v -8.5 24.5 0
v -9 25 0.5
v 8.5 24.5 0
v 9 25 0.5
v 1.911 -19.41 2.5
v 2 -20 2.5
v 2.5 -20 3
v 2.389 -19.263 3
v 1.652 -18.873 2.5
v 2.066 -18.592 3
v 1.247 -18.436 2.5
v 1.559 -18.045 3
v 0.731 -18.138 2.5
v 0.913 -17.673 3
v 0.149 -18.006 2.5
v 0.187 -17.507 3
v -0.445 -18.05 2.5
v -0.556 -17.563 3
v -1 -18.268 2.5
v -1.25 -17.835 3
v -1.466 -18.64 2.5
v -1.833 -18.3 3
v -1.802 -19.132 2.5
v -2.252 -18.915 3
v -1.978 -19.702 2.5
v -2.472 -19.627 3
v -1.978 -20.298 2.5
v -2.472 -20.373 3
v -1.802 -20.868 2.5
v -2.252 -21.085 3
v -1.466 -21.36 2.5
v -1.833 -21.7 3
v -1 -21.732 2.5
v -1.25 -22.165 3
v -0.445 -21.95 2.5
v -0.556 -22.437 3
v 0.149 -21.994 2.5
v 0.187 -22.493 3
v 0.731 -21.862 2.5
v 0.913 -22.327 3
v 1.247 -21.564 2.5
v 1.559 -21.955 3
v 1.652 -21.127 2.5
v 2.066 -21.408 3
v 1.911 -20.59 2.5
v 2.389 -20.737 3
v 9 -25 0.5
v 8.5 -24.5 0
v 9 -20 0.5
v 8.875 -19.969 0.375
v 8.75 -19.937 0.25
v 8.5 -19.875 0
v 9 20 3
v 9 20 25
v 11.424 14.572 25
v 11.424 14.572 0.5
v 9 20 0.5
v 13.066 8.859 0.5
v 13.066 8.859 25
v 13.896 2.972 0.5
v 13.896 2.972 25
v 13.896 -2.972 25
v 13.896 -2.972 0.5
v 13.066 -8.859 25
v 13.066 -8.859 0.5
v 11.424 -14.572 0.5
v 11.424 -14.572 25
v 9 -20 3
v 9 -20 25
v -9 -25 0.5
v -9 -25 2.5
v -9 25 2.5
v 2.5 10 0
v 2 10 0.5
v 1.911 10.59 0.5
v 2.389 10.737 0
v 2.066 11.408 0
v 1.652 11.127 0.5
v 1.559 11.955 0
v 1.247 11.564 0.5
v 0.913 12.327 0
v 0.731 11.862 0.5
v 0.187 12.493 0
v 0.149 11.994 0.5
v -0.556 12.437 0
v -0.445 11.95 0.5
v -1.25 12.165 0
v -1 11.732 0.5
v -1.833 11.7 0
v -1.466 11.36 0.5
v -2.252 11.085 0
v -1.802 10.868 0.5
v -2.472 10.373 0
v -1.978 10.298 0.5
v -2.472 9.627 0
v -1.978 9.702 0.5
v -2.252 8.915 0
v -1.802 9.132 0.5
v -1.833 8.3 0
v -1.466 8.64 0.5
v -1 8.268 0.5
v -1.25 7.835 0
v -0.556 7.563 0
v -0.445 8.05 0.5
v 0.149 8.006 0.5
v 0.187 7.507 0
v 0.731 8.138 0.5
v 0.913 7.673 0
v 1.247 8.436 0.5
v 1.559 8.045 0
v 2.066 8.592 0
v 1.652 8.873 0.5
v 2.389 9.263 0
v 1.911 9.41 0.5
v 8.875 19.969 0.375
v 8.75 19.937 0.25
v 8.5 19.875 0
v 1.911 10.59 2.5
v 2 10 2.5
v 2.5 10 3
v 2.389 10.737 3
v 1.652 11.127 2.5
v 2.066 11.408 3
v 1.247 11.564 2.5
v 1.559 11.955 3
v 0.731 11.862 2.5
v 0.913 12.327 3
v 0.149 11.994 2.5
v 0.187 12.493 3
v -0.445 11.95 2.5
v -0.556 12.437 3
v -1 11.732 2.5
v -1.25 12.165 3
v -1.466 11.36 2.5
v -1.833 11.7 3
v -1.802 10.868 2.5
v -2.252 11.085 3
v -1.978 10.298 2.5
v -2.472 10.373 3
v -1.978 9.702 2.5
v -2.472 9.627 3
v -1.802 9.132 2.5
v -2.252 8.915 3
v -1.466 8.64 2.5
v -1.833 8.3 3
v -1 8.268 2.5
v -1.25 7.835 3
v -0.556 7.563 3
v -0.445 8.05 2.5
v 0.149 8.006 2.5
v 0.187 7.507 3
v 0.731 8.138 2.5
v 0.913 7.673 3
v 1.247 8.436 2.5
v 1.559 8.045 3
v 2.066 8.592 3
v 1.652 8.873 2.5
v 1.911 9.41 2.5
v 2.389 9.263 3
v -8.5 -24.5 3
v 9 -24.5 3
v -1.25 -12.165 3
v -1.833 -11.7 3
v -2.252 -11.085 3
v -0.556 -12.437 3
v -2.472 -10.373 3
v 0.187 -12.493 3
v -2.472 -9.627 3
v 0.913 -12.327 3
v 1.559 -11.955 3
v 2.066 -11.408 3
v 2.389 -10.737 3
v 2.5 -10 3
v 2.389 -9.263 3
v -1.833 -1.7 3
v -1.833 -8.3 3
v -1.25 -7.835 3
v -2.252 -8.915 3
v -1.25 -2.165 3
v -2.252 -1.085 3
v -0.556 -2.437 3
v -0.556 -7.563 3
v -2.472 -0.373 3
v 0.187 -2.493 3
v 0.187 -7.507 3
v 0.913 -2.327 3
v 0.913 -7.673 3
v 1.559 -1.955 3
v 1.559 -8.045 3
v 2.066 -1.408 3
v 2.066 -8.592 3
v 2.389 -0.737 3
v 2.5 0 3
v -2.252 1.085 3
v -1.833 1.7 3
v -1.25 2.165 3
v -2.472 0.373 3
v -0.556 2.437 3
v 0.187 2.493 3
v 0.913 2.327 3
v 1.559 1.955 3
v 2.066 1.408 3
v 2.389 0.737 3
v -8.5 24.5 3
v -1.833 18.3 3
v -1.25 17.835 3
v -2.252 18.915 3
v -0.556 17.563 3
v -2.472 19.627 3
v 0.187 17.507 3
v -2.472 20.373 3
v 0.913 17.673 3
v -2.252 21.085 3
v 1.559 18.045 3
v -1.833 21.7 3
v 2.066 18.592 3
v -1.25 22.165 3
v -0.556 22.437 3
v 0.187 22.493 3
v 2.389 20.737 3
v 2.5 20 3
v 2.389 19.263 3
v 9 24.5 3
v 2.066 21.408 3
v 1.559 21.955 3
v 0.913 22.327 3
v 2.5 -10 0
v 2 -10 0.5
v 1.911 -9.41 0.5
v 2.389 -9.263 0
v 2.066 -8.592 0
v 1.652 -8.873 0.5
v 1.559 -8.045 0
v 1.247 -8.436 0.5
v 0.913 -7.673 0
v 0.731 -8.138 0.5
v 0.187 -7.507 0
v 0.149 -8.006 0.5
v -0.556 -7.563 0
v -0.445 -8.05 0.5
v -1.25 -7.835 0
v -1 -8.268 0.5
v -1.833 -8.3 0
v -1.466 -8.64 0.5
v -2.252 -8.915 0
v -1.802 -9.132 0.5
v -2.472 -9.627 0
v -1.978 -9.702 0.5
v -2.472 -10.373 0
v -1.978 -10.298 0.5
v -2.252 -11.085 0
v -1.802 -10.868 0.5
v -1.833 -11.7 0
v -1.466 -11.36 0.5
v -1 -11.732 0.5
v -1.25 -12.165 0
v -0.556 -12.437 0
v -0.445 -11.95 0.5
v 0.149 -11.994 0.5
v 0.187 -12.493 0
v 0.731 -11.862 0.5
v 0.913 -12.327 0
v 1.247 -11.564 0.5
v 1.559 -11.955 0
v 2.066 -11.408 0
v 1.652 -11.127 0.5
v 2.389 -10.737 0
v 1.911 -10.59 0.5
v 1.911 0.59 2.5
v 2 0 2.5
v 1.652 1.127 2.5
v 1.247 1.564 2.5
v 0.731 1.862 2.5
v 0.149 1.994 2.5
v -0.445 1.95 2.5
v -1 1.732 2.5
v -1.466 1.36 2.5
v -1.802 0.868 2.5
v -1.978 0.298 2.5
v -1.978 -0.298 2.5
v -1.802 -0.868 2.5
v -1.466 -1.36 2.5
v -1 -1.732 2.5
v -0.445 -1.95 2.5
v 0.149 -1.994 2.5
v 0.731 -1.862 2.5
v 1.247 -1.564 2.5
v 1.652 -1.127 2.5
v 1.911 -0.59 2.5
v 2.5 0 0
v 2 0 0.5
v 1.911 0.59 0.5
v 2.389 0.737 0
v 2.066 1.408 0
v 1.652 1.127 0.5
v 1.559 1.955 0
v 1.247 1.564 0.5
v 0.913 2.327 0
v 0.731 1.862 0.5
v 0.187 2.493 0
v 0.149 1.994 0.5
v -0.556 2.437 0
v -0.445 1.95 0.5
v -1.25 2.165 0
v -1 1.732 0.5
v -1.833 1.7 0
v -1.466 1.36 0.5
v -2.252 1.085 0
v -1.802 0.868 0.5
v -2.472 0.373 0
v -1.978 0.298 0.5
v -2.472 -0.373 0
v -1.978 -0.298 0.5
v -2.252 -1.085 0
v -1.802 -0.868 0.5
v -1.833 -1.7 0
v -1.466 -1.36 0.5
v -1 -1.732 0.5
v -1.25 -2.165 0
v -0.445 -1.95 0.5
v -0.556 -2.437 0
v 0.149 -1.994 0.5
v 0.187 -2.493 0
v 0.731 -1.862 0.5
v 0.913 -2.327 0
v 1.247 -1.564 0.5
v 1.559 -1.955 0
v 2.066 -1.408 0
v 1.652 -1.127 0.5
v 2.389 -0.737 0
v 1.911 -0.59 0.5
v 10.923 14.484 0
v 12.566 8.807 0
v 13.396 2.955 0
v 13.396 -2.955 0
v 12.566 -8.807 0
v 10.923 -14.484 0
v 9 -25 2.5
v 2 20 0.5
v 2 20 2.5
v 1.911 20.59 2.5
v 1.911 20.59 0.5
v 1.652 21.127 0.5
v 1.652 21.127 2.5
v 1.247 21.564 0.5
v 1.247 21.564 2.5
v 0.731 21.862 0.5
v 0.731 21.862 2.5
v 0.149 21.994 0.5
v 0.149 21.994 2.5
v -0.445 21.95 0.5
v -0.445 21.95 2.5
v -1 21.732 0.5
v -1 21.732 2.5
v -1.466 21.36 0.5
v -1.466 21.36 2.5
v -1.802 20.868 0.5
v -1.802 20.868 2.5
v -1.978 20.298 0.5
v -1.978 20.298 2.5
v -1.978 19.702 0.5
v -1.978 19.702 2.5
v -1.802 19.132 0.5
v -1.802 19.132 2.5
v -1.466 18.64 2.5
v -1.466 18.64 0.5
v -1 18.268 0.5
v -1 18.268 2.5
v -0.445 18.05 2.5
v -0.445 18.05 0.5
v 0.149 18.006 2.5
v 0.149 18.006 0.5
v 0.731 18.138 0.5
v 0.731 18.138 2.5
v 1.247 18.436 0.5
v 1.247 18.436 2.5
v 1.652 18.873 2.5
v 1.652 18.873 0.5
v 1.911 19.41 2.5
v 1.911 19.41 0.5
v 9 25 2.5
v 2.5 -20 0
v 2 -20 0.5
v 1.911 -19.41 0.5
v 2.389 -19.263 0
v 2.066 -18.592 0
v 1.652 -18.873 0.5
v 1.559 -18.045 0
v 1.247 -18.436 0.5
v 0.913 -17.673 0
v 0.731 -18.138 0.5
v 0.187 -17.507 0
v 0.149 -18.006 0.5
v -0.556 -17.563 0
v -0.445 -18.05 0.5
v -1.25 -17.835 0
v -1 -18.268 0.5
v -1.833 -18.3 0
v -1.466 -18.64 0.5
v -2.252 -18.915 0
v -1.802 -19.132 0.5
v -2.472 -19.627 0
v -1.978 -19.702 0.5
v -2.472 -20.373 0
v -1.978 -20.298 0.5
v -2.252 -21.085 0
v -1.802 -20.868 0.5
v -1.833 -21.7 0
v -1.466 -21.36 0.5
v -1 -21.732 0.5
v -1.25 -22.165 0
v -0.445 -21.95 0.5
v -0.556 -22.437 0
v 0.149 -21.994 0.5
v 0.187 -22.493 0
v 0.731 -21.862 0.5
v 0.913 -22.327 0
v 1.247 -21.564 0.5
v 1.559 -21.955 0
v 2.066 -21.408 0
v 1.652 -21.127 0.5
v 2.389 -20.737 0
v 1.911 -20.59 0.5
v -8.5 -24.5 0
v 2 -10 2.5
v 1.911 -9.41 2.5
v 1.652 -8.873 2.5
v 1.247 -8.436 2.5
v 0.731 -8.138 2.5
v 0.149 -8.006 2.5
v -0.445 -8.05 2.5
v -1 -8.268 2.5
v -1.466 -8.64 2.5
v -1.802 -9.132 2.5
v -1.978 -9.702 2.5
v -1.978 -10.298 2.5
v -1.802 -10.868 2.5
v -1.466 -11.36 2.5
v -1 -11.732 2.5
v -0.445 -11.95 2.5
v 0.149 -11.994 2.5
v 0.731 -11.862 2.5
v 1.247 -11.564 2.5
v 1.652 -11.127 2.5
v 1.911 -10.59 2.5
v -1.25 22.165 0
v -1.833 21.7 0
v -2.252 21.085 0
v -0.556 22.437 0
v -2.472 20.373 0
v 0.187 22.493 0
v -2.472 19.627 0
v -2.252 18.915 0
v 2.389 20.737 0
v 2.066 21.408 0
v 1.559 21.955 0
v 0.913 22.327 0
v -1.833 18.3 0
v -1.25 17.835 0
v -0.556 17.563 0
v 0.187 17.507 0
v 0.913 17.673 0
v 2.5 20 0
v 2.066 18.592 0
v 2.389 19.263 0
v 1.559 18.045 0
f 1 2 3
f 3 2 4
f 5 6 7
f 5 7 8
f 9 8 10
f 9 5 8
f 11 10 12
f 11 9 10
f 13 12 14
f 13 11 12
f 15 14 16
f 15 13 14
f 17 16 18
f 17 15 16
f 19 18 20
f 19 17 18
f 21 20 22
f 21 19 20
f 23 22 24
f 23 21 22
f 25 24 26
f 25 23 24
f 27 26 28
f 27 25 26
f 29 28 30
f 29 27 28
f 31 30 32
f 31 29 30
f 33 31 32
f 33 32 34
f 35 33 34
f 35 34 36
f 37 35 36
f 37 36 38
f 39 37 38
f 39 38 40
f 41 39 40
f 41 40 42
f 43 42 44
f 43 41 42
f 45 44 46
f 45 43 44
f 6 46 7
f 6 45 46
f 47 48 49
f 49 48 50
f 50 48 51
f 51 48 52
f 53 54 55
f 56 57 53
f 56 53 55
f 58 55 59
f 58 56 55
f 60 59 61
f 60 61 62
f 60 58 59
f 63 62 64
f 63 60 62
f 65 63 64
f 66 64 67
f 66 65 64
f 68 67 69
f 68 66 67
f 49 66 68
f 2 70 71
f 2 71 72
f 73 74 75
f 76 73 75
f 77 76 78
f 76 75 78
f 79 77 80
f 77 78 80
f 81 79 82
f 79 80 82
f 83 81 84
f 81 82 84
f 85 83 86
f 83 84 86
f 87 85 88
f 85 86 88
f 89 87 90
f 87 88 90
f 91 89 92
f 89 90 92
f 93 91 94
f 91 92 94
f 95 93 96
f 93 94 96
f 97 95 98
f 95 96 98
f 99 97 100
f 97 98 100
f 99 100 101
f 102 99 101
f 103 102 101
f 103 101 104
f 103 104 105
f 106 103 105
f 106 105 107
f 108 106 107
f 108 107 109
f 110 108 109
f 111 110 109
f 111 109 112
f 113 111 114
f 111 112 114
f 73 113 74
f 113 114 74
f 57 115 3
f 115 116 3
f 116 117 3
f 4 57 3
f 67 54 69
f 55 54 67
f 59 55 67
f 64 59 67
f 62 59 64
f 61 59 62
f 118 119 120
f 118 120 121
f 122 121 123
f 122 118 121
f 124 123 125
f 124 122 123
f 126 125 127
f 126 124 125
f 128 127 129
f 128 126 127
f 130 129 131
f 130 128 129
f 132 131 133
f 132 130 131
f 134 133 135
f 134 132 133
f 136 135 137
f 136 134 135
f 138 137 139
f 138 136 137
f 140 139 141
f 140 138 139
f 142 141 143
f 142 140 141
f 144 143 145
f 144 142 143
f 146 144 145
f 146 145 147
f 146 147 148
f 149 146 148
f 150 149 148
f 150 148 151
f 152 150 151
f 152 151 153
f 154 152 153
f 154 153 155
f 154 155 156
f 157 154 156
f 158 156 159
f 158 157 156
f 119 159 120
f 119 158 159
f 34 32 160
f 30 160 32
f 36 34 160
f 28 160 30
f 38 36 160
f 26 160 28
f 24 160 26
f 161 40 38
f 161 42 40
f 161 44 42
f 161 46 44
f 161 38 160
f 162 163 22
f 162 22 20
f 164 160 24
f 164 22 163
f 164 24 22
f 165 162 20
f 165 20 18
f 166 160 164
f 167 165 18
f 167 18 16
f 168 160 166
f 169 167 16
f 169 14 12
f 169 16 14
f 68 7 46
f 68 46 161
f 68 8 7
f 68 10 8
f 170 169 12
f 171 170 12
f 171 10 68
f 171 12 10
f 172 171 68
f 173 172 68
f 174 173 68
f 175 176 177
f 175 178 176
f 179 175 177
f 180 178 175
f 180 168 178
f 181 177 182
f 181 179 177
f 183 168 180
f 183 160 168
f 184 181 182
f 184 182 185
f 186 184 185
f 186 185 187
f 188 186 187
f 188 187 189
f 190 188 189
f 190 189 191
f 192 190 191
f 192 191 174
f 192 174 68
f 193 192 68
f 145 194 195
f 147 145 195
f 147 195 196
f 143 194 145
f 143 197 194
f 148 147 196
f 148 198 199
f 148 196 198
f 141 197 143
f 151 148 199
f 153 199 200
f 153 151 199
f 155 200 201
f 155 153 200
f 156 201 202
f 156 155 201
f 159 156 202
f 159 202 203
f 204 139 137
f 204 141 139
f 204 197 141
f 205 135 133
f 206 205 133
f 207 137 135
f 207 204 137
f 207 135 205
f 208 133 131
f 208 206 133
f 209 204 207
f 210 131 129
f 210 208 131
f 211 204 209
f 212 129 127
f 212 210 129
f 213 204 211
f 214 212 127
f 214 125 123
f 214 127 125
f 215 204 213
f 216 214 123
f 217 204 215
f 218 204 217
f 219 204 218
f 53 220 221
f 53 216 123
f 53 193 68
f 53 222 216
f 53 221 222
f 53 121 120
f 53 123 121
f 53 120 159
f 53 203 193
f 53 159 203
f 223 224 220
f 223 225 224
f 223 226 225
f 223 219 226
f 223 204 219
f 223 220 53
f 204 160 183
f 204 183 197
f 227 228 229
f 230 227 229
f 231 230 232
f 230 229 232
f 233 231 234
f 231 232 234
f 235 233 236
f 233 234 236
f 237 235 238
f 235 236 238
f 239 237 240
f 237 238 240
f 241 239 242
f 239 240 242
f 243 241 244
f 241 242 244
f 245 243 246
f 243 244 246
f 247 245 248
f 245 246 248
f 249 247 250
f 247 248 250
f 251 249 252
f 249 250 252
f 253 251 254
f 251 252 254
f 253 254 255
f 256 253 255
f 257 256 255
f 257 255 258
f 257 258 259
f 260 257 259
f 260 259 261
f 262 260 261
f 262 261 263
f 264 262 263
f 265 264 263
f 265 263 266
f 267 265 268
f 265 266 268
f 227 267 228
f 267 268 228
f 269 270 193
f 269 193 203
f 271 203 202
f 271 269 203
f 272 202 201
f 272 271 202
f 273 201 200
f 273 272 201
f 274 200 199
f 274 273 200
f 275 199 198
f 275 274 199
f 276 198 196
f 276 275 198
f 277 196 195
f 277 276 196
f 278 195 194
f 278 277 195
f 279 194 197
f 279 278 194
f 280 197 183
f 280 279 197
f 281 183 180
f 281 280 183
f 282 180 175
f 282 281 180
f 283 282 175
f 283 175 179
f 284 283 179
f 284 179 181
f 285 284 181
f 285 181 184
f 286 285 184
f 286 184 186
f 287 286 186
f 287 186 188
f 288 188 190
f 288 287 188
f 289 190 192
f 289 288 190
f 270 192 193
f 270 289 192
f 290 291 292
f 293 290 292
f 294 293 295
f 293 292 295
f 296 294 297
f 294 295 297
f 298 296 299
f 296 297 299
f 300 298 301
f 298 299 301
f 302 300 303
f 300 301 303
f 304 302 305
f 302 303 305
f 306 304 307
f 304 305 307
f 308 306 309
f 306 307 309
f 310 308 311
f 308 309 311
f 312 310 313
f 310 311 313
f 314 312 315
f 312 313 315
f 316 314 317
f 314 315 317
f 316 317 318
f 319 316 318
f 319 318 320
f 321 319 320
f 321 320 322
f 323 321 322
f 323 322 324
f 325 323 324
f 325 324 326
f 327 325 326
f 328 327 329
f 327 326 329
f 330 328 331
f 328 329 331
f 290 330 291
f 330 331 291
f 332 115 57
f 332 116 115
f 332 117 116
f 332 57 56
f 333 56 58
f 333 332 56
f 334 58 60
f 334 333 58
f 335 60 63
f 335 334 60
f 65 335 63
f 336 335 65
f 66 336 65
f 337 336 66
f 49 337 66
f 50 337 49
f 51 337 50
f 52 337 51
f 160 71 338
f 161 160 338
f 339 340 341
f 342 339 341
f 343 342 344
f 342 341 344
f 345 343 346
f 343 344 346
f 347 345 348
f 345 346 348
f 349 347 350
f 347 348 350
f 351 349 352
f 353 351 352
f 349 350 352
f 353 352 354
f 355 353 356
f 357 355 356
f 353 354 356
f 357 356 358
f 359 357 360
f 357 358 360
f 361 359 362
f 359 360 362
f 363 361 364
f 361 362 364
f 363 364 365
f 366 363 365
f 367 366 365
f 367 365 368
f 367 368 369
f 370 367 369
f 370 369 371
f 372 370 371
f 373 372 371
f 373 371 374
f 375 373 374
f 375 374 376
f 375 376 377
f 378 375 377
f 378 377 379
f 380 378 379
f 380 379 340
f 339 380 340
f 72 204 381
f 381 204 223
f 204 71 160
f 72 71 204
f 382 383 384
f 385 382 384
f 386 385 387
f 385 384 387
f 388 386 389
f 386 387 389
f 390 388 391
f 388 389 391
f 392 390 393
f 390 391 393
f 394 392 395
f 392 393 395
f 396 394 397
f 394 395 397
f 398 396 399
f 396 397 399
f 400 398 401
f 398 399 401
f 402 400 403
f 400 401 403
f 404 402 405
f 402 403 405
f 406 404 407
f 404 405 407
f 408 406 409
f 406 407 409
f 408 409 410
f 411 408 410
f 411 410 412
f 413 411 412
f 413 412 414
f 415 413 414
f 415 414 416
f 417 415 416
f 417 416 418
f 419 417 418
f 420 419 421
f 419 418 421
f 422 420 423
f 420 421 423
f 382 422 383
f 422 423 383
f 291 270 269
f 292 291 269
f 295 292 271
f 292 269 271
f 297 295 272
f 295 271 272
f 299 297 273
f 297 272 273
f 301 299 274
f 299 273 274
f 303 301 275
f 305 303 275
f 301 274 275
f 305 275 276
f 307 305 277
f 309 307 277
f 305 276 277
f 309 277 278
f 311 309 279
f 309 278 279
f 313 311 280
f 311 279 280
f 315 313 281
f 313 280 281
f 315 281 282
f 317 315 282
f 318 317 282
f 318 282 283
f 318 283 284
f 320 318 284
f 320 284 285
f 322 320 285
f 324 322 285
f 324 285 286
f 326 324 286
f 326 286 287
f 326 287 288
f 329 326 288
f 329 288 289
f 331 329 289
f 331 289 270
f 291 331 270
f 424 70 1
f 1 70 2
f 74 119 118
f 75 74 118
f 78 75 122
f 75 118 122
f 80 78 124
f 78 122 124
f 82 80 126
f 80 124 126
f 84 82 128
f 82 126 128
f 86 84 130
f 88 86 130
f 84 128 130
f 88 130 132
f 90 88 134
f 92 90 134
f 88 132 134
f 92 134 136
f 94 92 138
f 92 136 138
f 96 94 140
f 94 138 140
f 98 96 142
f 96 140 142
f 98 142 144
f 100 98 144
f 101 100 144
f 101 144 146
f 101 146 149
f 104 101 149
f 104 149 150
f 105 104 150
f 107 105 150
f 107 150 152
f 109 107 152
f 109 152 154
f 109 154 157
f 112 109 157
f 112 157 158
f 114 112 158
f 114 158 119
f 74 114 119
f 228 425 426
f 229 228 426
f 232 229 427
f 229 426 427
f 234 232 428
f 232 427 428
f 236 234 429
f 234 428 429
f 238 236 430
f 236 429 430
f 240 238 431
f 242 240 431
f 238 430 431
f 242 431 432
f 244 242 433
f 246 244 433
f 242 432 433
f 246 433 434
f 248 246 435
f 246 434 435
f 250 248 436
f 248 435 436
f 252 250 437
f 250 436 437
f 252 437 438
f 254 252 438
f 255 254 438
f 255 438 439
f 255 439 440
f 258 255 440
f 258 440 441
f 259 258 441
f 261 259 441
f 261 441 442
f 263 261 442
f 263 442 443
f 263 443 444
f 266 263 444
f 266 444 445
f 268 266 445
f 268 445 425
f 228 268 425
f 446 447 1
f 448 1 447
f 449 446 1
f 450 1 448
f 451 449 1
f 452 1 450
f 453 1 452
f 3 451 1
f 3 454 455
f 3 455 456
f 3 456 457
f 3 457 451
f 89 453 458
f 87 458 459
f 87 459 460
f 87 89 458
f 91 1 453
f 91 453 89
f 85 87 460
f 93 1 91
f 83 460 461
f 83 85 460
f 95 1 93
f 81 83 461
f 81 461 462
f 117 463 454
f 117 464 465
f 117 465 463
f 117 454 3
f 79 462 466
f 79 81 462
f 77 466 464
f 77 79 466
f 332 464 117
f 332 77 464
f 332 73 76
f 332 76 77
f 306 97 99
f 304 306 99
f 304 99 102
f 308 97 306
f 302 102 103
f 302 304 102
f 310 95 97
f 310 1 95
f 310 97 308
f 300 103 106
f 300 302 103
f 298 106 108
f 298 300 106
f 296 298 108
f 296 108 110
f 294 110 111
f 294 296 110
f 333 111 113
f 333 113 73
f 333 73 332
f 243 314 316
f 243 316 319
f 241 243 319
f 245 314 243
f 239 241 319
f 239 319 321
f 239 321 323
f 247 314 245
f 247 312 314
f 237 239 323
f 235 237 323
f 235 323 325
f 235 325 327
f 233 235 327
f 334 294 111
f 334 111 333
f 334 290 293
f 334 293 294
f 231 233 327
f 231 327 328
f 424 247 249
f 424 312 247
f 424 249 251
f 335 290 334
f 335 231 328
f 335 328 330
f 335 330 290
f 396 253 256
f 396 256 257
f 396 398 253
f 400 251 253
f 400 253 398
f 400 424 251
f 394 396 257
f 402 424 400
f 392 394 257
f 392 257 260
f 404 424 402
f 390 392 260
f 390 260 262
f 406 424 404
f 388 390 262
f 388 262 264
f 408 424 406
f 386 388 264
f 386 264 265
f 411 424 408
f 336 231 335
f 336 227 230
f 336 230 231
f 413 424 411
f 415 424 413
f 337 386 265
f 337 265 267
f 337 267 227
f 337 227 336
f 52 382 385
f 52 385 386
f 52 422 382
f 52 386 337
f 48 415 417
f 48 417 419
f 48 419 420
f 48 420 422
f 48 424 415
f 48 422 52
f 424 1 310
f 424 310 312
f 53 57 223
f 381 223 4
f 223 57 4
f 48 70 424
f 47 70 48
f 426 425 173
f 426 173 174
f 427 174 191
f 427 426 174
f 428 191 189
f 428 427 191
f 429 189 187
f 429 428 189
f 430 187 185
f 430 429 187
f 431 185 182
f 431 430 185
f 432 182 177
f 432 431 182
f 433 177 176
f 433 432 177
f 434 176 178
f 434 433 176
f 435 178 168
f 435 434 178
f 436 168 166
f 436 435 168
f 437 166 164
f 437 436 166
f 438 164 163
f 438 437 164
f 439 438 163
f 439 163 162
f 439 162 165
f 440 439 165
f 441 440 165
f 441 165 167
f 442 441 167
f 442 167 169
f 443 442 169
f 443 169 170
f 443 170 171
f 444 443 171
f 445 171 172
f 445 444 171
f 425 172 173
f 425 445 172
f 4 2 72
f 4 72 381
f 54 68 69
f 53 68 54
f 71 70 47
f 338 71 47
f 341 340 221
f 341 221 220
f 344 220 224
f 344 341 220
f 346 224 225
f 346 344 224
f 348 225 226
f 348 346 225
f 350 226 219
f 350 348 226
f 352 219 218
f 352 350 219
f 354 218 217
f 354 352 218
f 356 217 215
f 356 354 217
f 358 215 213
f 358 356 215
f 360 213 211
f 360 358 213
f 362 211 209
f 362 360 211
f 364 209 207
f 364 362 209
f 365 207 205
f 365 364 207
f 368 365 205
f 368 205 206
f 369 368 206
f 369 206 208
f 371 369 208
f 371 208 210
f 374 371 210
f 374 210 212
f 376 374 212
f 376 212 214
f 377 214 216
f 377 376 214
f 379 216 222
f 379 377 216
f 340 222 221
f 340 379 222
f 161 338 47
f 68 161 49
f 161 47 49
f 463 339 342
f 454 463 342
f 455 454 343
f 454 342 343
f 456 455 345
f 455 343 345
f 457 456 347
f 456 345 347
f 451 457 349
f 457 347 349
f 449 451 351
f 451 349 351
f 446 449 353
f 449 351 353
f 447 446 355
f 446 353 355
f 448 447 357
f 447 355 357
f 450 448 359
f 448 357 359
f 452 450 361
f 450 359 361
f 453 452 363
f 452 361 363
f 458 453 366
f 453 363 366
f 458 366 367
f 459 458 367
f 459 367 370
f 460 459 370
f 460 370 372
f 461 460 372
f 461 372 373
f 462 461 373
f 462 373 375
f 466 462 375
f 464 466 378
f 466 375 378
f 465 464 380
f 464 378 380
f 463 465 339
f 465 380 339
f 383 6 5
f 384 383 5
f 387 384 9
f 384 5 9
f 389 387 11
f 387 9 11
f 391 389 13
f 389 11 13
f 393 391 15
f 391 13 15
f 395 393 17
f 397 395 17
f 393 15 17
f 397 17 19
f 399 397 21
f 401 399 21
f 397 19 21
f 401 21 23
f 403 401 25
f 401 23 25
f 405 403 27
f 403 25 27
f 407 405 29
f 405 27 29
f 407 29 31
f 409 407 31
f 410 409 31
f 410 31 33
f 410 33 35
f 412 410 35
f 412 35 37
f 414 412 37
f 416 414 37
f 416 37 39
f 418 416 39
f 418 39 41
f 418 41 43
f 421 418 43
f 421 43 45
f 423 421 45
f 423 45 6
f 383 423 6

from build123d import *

# Parameters (mm, degrees)
SKETCH_W     = 18
SKETCH_H     = 50
PAD_DEPTH    = 3
SKETCH002_R  = 2
POCKET_DEPTH = 5
PAD001_DEPTH = 25
CHAMFER_SIZE = 0.5


with BuildPart() as part:
    # Sketch → Pad (new body)
    with BuildSketch(Plane.XY):
        Rectangle(SKETCH_W, SKETCH_H)
    extrude(amount=PAD_DEPTH)

    # Sketch002 → Pocket (cut)
    with BuildSketch(Plane.XY.offset(3)):
        with Locations((0, 10)):
            Circle(SKETCH002_R)
        with Locations((0, -10)):
            Circle(SKETCH002_R)
        with Locations((0, 20)):
            Circle(SKETCH002_R)
        Circle(SKETCH002_R)
        with Locations((0, -20)):
            Circle(SKETCH002_R)
    extrude(amount=-POCKET_DEPTH, mode=Mode.SUBTRACT)

    # Sketch003 (on Face4 of Pocket) → Pad001 (join)
    with BuildSketch(Plane(origin=(0, 0, 0), x_dir=(1, 0, 0), z_dir=(0, 0, -1))):
        with BuildLine():
            ThreePointArc((9, -20), (14, 0), (9, 20))
            Line((9, 20), (9, -20))
        make_face()
    extrude(amount=-PAD001_DEPTH)

    # Chamfer
    chamfer_edges = [part.edges().sort_by_distance(p)[0] for p in [
        (0, 25, 0),
        (9, 22.5, 0),
        (14, 0, 0),
        (9, -22.5, 0),
        (0, -25, 0),
        (-9, 0, 0),
        (-2, -20, 0),
        (-2, 20, 0),
        (-2, -10, 0),
        (-2, 0, 0),
        (-2, 10, 0),
        (0, 25, 3),
        (-9, 0, 3),
        (0, -25, 3),
        (-2, 20, 3),
        (-2, 10, 3),
        (-2, 0, 3),
        (-2, -10, 3),
        (-2, -20, 3),
    ]]
    chamfer(chamfer_edges, length=CHAMFER_SIZE)


solid = part.part
